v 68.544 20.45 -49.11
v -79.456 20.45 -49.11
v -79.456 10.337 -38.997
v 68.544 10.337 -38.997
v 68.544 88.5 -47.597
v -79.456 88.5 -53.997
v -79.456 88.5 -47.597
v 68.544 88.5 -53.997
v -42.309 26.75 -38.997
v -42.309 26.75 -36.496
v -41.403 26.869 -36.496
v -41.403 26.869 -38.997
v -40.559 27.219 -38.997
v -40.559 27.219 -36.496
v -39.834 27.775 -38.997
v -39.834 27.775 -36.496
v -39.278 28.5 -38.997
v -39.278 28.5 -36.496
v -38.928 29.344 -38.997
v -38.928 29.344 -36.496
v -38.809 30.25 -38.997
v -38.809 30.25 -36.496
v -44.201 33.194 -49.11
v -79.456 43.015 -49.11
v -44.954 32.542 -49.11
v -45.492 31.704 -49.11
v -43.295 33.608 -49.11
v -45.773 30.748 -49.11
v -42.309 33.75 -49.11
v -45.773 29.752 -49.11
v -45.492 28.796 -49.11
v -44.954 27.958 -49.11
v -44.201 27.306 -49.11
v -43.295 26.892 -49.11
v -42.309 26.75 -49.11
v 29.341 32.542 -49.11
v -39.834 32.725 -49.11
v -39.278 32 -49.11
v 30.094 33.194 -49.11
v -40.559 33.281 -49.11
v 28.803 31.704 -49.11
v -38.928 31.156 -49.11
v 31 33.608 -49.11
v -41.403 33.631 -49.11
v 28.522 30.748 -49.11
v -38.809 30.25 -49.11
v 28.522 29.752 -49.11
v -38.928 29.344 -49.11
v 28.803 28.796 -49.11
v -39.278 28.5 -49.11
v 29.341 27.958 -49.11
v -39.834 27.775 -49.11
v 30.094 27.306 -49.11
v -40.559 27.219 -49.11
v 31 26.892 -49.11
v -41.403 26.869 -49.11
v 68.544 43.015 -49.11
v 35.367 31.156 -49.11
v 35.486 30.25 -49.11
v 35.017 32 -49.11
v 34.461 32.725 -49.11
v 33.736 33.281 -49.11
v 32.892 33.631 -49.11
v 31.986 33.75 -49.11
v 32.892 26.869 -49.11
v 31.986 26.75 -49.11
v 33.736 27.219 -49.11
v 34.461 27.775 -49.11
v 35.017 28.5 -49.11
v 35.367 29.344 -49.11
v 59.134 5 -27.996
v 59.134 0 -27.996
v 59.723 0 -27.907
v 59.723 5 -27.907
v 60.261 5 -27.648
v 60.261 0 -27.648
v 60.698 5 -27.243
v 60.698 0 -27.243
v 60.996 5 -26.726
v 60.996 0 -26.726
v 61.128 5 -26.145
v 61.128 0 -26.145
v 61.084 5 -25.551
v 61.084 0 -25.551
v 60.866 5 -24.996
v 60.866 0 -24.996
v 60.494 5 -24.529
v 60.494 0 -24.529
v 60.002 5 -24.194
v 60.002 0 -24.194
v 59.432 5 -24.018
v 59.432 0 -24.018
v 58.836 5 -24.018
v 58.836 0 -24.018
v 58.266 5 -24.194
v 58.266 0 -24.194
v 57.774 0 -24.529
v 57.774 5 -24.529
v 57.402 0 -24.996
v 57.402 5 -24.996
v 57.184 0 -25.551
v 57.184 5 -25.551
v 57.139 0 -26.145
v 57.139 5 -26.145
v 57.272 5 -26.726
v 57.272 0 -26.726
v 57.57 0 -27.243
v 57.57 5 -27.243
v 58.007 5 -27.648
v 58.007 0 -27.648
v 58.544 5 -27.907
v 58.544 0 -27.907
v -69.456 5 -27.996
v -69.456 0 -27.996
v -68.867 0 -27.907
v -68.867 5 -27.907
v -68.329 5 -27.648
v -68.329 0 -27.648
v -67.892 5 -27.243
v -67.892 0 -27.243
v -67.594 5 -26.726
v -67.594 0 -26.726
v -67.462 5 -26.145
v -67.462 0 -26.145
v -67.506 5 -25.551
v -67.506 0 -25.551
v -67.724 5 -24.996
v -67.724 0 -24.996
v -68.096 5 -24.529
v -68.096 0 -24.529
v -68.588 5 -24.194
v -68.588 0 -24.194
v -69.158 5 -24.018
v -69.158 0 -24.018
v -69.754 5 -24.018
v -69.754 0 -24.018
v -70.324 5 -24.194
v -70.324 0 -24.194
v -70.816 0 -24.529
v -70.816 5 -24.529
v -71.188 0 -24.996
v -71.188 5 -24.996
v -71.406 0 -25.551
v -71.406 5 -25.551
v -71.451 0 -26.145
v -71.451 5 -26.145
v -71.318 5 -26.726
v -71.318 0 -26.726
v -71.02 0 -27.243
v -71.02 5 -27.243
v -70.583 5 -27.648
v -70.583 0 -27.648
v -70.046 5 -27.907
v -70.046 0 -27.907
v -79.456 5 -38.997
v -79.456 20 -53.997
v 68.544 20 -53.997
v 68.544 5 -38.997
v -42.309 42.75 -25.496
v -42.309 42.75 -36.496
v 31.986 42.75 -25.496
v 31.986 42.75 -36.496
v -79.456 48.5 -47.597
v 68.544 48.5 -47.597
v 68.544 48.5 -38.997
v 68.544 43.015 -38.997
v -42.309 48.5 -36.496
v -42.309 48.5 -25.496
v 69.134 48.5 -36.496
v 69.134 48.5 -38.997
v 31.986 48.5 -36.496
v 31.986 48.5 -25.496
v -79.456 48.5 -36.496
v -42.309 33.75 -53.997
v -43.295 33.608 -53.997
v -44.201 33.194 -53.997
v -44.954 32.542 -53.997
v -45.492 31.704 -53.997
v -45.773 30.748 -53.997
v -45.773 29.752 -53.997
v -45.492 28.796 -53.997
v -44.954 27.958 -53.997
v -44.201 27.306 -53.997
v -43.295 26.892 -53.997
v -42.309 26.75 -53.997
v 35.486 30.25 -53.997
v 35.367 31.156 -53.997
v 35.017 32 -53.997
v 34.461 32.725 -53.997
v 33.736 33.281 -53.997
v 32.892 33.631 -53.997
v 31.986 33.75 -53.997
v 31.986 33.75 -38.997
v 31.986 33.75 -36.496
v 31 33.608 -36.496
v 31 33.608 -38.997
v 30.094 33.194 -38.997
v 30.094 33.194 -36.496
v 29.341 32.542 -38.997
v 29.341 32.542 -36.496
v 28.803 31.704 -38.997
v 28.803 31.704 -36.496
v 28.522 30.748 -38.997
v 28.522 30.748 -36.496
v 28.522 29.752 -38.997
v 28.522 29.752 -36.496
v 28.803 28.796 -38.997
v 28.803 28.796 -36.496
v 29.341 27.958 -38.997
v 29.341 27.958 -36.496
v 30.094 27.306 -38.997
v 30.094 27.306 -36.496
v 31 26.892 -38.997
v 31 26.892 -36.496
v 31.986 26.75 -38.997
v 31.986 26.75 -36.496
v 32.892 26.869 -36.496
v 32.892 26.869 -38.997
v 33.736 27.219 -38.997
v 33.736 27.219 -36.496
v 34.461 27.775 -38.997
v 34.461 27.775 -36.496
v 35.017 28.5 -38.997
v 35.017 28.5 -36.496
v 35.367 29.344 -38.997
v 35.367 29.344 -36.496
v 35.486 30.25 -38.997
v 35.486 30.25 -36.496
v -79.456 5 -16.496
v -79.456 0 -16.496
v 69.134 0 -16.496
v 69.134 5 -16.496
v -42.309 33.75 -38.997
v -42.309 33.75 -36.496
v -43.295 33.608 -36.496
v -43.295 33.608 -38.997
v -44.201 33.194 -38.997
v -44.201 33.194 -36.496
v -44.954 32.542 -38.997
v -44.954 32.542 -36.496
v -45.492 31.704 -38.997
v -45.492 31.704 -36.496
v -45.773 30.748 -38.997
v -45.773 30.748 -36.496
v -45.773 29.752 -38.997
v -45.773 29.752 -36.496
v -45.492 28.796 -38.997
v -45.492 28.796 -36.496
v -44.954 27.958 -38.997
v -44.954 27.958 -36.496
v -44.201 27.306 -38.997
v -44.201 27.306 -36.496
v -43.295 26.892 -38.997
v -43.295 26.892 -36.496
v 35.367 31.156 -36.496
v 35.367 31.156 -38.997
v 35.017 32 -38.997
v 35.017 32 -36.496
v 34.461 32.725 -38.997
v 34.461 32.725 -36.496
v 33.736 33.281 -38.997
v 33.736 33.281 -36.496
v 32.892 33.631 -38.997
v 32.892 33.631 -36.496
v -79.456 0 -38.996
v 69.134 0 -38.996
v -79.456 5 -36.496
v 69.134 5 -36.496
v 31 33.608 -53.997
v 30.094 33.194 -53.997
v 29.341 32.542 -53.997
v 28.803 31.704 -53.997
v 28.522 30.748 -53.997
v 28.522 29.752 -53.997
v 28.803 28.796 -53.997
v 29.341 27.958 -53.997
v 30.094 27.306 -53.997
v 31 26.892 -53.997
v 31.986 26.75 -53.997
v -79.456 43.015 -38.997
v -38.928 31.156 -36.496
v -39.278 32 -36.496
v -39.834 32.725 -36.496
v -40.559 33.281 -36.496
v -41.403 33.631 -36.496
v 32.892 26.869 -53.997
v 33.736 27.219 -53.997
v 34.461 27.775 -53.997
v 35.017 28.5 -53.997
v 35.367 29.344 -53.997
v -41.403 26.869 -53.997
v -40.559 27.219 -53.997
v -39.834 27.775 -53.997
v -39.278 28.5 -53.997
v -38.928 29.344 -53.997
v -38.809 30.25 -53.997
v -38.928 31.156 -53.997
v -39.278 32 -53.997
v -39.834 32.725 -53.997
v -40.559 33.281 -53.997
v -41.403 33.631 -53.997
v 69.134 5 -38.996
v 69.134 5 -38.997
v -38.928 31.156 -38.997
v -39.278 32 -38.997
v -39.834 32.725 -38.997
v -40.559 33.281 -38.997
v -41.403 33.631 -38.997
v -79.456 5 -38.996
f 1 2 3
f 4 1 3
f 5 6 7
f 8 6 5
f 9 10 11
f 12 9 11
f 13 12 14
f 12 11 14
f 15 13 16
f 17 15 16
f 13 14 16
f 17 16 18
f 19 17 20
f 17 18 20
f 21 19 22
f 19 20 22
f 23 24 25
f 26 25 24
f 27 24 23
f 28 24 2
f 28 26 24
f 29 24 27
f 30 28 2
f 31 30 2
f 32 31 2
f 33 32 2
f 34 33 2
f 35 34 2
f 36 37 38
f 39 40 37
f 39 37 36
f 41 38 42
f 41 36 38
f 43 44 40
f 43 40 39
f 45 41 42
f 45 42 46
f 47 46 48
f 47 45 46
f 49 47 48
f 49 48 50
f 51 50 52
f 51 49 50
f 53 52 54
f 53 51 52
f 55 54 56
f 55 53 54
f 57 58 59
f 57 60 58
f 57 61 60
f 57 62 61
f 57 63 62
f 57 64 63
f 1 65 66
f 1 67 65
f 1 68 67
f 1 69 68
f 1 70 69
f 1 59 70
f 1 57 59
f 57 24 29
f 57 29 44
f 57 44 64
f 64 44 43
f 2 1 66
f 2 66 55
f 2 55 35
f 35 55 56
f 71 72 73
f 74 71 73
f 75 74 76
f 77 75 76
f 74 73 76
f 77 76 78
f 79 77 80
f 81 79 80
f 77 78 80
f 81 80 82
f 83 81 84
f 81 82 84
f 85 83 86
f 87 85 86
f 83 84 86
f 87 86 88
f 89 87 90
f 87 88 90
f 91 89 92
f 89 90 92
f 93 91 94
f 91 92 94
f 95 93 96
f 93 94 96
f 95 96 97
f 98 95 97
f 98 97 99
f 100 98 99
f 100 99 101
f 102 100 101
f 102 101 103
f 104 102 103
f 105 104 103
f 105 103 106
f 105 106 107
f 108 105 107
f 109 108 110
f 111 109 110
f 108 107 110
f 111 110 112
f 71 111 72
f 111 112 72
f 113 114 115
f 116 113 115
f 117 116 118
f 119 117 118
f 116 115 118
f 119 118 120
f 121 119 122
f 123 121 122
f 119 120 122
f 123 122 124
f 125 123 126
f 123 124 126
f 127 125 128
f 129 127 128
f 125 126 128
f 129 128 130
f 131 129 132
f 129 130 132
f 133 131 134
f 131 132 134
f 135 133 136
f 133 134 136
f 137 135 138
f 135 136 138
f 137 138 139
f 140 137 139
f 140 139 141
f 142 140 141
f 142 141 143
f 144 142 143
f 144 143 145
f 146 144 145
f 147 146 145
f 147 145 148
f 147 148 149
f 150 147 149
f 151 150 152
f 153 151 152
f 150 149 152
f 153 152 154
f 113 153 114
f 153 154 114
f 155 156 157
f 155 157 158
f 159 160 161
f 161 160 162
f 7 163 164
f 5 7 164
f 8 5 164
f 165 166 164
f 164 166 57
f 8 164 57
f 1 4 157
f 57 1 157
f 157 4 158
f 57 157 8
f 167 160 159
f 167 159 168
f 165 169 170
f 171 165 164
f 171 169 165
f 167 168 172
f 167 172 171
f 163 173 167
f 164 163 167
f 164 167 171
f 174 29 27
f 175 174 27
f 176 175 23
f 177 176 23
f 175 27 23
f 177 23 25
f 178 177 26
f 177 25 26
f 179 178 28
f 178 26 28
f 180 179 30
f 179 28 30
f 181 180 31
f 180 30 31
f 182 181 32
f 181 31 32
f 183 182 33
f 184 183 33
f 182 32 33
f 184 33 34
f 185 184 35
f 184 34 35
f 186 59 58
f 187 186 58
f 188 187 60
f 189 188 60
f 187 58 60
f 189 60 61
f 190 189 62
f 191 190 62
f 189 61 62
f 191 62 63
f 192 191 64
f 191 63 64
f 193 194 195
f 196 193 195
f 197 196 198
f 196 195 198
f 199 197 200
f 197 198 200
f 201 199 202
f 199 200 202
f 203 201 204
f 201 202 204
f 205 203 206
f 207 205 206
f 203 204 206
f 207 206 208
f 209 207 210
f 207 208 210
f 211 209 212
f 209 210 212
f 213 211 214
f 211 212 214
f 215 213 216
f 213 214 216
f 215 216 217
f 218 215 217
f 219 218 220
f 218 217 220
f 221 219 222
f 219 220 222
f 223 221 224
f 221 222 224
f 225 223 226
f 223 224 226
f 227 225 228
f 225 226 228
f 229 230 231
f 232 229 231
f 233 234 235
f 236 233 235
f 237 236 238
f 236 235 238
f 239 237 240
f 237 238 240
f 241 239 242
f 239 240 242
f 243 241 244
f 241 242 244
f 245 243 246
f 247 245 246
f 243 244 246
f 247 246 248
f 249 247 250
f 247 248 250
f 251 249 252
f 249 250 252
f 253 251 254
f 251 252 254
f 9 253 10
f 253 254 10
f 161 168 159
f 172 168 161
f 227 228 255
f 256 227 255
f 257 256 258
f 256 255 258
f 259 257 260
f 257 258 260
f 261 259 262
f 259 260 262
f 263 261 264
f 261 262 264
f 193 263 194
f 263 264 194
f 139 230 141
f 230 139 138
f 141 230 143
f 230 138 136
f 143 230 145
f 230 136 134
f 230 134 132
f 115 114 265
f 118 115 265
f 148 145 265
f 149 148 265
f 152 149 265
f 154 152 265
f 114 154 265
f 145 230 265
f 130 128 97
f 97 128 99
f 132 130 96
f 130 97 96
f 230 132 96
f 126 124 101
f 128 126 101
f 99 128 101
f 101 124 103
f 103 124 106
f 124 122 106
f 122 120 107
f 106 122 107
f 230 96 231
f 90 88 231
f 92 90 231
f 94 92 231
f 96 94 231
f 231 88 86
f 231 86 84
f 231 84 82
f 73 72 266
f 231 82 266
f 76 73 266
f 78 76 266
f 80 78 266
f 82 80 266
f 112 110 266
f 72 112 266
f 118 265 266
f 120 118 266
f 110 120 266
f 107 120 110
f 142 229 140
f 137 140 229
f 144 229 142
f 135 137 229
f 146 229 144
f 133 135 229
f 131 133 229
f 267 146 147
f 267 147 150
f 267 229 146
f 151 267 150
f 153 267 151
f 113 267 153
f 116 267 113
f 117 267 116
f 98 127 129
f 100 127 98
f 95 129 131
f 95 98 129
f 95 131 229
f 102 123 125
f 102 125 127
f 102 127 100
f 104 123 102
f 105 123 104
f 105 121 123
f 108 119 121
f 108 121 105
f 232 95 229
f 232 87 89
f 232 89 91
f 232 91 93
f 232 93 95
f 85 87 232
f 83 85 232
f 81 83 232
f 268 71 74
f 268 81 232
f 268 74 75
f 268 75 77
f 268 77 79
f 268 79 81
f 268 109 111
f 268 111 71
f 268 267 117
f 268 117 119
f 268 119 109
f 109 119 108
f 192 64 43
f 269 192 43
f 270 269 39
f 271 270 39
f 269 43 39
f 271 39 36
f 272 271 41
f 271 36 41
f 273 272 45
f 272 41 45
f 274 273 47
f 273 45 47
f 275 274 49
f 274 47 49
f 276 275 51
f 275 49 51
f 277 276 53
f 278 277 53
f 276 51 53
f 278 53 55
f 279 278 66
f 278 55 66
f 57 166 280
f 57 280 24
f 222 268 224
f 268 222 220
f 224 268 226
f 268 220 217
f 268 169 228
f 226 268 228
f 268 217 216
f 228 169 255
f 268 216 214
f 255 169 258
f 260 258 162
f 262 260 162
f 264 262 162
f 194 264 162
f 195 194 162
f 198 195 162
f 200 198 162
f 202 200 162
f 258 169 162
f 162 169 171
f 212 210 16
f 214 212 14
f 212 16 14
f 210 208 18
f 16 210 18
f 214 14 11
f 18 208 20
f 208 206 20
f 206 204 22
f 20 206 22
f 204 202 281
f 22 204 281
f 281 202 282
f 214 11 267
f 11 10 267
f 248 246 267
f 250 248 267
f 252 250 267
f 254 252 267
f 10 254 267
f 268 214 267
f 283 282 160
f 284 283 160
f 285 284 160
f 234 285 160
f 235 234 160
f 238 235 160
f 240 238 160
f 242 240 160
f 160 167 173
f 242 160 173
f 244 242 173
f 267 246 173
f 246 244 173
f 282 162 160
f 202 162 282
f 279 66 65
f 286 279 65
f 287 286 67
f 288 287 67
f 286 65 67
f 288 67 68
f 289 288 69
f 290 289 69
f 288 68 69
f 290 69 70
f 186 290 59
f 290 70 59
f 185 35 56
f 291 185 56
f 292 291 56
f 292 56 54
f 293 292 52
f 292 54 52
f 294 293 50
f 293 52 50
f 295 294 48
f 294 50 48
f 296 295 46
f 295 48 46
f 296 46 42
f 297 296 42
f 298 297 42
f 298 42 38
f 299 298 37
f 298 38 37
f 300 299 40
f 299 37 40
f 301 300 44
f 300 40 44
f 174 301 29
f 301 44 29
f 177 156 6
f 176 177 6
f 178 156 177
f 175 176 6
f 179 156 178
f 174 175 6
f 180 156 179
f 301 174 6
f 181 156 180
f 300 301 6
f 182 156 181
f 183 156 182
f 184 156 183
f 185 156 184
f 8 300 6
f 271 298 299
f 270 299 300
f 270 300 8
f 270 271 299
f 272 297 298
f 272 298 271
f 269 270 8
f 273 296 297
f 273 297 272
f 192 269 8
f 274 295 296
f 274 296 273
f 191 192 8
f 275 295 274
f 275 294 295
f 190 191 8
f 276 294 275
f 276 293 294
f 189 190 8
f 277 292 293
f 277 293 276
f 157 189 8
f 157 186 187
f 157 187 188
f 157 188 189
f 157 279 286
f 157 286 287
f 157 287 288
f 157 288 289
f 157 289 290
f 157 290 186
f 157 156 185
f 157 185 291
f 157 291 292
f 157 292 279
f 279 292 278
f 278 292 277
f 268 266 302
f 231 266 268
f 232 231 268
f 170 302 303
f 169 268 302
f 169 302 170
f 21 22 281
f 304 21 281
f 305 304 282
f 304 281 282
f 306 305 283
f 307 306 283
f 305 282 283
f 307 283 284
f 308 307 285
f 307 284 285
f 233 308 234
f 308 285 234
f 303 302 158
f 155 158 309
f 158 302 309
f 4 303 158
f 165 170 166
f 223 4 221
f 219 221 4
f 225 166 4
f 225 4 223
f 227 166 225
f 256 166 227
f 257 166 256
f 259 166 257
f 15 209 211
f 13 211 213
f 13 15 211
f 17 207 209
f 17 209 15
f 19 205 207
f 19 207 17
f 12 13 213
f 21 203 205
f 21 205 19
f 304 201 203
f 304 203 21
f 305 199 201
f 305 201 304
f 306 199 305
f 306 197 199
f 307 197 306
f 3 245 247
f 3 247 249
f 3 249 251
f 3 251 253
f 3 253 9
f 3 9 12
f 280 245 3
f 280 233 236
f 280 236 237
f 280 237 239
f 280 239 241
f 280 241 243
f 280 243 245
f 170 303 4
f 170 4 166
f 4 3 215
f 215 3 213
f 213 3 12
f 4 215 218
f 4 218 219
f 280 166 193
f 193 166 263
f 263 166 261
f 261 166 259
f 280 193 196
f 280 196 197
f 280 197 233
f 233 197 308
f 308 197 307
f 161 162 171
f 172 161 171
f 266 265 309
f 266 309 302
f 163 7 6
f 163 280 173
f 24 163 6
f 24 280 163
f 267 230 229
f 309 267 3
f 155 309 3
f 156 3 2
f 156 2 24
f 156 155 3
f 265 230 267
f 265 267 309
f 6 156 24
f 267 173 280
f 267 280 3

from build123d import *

# Parameters (mm, degrees)
ESQUISSE1_W             = 148.59
ESQUISSE1_H             = 2.5
ESQUISSE1_H_2           = 20
BOSS_EXTRU_2_DEPTH      = 5
BOSS_EXTRU_4_DEPTH      = 0.001
BOSS_EXTRU_4_DEPTH_BACK = 2.5
ESQUISSE2_W             = 148.59
ESQUISSE2_H             = 43.5
ESQUISSE3_R             = 2
ENL_V_MAT_EXTRU_1_DEPTH = 5
BOSS_EXTRU_9_DEPTH      = 148
ENL_V_MAT_EXTRU_2_DEPTH = 148
ENL_V_MAT_EXTRU_3_DEPTH = 158
ESQUISSE7_W             = 74.295
ESQUISSE7_H             = 5.75
BOSS_EXTRU_10_DEPTH     = 11
ESQUISSE8_W             = 148
ESQUISSE8_H             = 6.4
BOSS_EXTRU_11_DEPTH     = 40


with BuildPart() as part:
    # Esquisse1 → Boss.-Extru.2 (new body)
    with BuildSketch(Plane(origin=(0, 0, 0), x_dir=(1, 0, 0), z_dir=(0, 1, 0))):
        with Locations((-5.161134174, 17.745562161)):
            Rectangle(ESQUISSE1_W, ESQUISSE1_H)
        with Locations((-5.161134174, 28.995562161)):
            Rectangle(ESQUISSE1_W, ESQUISSE1_H_2)
    extrude(amount=BOSS_EXTRU_2_DEPTH)

    # Esquisse2 → Boss.-Extru.4 (add, two sides: drawn at the far end of the back side and taken through both)
    with BuildSketch(Plane(origin=(0, 0, -38.995562161), x_dir=(-1, 0, 0), z_dir=(0, 0, -1)).offset(-BOSS_EXTRU_4_DEPTH_BACK)):
        with Locations((5.161134174, 26.75)):
            Rectangle(ESQUISSE2_W, ESQUISSE2_H)
    extrude(amount=BOSS_EXTRU_4_DEPTH + BOSS_EXTRU_4_DEPTH_BACK)

    # Esquisse3 → Enlèv. mat.-Extru.1 (cut)
    with BuildSketch(Plane.XZ):
        with Locations(Location((-69.456134174, -25.995562161, 0), (0, 0, 270))):
            Circle(ESQUISSE3_R)
        with Locations(Location((59.133865826, -25.995562161, 0), (0, 0, 270))):
            Circle(ESQUISSE3_R)
    extrude(amount=-ENL_V_MAT_EXTRU_1_DEPTH, mode=Mode.SUBTRACT)

    # Esquisse4 → Boss.-Extru.9 (add)
    with BuildSketch(Plane.ZY.offset(79.456134174)):
        Polygon((-38.996562161, 5), (-38.996562161, 48.5), (-53.996562161, 48.5), (-53.996562161, 20), align=None)
    extrude(amount=-BOSS_EXTRU_9_DEPTH)

    # Esquisse5 → Enlèv. mat.-Extru.2 (cut)
    with BuildSketch(Plane.XY.offset(-36.495562161)):
        with BuildLine():
            ThreePointArc((31.986365826, 33.75), (28.486365826, 30.25), (31.986365826, 26.75))
            Line((31.986365826, 26.75), (31.986365826, 33.75))
        make_face()
        with BuildLine():
            Line((31.986365826, 33.75), (31.986365826, 26.75))
            ThreePointArc((31.986365826, 26.75), (34.46123956, 27.775126266), (35.486365826, 30.25))
            ThreePointArc((35.486365826, 30.25), (34.46123956, 32.724873734), (31.986365826, 33.75))
        make_face()
        with BuildLine():
            ThreePointArc((-38.808634174, 30.25), (-39.83376044, 32.724873734), (-42.308634174, 33.75))
            Line((-42.308634174, 33.75), (-42.308634174, 26.75))
            ThreePointArc((-42.308634174, 26.75), (-39.83376044, 27.775126266), (-38.808634174, 30.25))
        make_face()
        with BuildLine():
            Line((-42.308634174, 26.75), (-42.308634174, 33.75))
            ThreePointArc((-42.308634174, 33.75), (-45.808634174, 30.25), (-42.308634174, 26.75))
        make_face()
    extrude(amount=-ENL_V_MAT_EXTRU_2_DEPTH, mode=Mode.SUBTRACT)

    # Esquisse6 → Enlèv. mat.-Extru.3 (cut)
    with BuildSketch(Plane(origin=(68.543865826, 0, 0), x_dir=(0, 0, -1), z_dir=(1, 0, 0))):
        Polygon((38.996562161, 43.015232444), (49.10993279, 43.015232444), (49.10993279, 20.45031737), (38.996562161, 10.336946741), align=None)
    extrude(amount=-ENL_V_MAT_EXTRU_3_DEPTH, mode=Mode.SUBTRACT)

    # Esquisse7 → Boss.-Extru.10 (add)
    with BuildSketch(Plane.XY.offset(-36.495562161)):
        with Locations((-5.161134174, 45.625)):
            Rectangle(ESQUISSE7_W, ESQUISSE7_H)
    extrude(amount=BOSS_EXTRU_10_DEPTH)

    # Esquisse8 → Boss.-Extru.11 (add)
    with BuildSketch(Plane(origin=(0, 48.5, 0), x_dir=(1, 0, 0), z_dir=(0, 1, 0))):
        with Locations((-5.456134174, 50.796562161)):
            Rectangle(ESQUISSE8_W, ESQUISSE8_H)
    extrude(amount=BOSS_EXTRU_11_DEPTH)


solid = part.part
